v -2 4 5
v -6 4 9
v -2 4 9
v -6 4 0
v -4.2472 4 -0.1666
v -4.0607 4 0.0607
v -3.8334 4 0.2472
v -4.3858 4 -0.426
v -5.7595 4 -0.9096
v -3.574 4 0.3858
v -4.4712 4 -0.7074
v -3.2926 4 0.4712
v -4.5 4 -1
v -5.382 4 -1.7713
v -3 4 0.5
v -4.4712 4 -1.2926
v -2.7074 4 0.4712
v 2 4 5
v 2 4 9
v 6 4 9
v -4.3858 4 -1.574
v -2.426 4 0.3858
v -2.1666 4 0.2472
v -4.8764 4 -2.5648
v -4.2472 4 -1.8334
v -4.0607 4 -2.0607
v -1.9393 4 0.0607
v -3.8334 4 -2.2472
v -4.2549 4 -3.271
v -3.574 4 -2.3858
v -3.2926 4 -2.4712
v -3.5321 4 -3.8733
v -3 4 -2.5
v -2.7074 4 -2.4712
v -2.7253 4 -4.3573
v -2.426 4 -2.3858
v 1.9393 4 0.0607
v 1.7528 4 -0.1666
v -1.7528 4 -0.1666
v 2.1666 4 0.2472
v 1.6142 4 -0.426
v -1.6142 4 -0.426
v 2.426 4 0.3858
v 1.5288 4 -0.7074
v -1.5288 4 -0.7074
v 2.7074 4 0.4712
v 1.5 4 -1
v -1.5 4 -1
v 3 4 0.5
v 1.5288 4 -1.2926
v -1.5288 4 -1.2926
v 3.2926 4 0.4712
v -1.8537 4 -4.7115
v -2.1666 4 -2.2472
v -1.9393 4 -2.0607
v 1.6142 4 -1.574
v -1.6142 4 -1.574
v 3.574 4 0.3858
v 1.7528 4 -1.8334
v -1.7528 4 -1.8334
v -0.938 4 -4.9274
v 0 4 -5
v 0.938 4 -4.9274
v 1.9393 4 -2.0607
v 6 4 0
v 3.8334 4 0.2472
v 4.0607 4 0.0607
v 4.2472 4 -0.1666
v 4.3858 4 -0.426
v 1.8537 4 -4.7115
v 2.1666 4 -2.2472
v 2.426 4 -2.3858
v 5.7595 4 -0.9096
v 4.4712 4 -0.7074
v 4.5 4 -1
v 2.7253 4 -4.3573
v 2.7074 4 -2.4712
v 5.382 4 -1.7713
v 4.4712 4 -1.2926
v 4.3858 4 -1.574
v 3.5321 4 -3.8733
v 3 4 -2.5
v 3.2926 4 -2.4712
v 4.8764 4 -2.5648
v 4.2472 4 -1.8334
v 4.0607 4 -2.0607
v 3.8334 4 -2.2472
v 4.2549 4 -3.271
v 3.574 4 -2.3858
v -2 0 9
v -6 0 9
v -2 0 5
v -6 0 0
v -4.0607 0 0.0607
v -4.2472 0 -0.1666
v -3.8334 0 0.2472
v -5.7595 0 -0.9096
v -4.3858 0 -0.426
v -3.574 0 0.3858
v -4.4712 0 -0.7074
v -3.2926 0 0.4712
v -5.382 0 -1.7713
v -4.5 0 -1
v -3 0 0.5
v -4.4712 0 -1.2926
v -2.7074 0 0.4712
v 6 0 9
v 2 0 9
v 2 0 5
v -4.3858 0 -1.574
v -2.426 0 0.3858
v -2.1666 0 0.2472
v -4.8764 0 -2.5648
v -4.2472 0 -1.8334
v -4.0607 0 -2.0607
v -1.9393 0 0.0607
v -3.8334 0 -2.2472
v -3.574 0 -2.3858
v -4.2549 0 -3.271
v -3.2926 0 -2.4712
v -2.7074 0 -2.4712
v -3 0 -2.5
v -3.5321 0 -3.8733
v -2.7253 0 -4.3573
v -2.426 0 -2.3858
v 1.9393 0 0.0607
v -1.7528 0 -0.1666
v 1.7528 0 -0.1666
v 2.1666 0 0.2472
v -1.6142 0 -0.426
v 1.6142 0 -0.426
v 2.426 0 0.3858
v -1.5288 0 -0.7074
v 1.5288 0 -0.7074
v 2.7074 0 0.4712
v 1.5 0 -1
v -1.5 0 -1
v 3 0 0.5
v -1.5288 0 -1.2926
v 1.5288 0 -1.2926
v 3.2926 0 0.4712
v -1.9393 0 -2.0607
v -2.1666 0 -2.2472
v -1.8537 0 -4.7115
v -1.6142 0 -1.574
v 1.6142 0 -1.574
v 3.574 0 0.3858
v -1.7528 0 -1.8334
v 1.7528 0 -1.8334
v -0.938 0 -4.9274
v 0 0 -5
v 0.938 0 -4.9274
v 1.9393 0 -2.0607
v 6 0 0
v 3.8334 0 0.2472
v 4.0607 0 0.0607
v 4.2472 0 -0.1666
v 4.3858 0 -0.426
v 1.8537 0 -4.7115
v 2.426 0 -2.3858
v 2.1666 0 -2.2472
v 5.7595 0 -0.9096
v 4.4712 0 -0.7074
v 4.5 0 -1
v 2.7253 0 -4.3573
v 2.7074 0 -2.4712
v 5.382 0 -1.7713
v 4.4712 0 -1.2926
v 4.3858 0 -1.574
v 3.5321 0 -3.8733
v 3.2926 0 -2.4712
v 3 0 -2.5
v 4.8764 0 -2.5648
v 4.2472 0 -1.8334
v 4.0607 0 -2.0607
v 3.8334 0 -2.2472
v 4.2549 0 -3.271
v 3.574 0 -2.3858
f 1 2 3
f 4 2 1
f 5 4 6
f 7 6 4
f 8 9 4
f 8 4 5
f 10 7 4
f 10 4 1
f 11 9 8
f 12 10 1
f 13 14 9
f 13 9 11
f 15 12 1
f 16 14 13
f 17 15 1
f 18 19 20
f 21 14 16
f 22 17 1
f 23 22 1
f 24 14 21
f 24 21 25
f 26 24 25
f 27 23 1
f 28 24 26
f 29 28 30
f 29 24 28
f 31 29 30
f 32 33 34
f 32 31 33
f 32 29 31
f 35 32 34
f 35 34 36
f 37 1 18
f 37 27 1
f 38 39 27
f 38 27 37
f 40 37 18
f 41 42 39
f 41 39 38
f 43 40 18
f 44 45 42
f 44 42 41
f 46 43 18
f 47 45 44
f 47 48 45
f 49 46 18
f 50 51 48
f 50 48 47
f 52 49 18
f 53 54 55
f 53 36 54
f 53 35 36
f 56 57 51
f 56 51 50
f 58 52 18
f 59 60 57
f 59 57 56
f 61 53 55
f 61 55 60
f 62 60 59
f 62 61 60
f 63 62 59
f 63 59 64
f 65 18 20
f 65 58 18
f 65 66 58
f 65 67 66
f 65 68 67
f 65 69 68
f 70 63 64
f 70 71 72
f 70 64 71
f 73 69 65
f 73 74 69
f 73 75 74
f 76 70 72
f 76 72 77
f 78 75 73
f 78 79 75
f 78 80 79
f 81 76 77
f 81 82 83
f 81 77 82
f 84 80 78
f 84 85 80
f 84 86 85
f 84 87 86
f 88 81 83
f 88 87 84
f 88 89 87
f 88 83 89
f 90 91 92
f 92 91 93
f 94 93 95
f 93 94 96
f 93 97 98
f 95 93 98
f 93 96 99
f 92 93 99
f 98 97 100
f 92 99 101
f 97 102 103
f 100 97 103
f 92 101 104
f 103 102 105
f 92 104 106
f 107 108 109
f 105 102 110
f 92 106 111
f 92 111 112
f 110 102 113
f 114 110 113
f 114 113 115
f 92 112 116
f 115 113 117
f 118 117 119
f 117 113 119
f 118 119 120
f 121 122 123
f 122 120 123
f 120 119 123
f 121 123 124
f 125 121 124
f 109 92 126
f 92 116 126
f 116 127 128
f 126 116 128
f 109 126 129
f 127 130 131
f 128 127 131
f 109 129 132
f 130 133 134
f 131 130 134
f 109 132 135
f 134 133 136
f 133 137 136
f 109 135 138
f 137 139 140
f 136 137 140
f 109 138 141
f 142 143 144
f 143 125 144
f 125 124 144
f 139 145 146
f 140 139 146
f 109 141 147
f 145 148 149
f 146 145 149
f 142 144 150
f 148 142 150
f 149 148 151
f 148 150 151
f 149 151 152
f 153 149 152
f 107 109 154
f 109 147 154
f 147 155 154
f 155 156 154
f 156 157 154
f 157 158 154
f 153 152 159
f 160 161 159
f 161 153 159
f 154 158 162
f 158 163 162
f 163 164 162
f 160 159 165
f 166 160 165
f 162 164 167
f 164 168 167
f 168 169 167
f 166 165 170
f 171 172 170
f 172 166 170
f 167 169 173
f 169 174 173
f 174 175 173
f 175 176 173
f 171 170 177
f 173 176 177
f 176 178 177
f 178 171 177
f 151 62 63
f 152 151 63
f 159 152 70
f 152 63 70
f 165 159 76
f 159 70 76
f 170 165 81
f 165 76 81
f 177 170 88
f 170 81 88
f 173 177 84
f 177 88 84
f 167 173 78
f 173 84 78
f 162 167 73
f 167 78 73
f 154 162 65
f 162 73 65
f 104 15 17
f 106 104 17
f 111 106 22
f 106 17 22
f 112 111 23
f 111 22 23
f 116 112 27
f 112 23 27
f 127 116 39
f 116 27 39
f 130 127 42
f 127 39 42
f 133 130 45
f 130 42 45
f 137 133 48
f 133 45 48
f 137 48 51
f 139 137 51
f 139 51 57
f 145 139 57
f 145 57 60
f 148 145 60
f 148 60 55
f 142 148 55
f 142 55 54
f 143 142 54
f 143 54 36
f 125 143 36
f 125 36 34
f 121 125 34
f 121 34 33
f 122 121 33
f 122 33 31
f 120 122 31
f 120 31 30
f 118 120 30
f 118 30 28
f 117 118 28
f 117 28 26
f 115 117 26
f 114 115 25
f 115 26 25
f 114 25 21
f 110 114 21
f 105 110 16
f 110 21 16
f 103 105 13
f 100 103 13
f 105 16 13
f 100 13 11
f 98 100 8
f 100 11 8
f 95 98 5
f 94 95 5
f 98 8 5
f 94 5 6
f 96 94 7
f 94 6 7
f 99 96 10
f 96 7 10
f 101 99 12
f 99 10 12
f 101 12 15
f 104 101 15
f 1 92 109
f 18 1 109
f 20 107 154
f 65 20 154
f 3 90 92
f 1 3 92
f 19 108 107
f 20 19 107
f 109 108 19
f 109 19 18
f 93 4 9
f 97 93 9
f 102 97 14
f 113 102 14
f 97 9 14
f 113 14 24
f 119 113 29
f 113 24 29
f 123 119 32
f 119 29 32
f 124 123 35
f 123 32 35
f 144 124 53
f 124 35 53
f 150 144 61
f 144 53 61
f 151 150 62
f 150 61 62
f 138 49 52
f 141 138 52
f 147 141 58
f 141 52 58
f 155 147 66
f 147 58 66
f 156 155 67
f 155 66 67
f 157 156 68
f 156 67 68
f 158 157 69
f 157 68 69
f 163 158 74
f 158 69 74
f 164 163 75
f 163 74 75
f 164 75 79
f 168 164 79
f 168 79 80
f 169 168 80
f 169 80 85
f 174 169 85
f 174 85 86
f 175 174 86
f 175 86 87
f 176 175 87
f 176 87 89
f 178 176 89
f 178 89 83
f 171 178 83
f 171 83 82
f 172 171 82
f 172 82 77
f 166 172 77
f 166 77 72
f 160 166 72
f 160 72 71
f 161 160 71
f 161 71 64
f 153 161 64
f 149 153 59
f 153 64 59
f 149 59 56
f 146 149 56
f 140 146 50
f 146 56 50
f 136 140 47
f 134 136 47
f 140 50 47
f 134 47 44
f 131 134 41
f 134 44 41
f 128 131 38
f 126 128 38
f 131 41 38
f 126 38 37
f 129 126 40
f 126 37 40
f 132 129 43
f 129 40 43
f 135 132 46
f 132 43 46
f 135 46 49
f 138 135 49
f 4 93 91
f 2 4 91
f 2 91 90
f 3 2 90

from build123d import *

# Parameters (mm, degrees)
SKETCH1_W           = 12
SKETCH1_H           = 10
SKETCH1_W_2         = 4
SKETCH1_H_2         = 4
BOSS_EXTRUDE1_DEPTH = 4
SKETCH2_R           = 1.5
CUT_EXTRUDE1_DEPTH  = 12.532562595
CUT_EXTRUDE3_DEPTH  = 4


with BuildPart() as part:
    # Sketch1 → Boss-Extrude1 (new body)
    with BuildSketch(Plane(origin=(0, 0, 0), x_dir=(1, 0, 0), z_dir=(0, 1, 0))):
        Rectangle(SKETCH1_W, SKETCH1_H)
        with Locations((-4, -7)):
            Rectangle(SKETCH1_W_2, SKETCH1_H_2)
        with Locations((4, -7)):
            Rectangle(SKETCH1_W_2, SKETCH1_H_2)
    extrude(amount=BOSS_EXTRUDE1_DEPTH)

    # Sketch2 → Cut-Extrude1 (cut, through all)
    with BuildSketch(Plane(origin=(0, 4, 0), x_dir=(1, 0, 0), z_dir=(0, 1, 0))):
        with Locations(Location((-3, 1, 0), (0, 0, 270))):
            Circle(SKETCH2_R)
        with Locations(Location((3, 1, 0), (0, 0, 270))):
            Circle(SKETCH2_R)
    extrude(amount=-CUT_EXTRUDE1_DEPTH, mode=Mode.SUBTRACT)

    # Sketch3 → Cut-Extrude3 (cut)
    with BuildSketch(Plane(origin=(0, 4, 0), x_dir=(1, 0, 0), z_dir=(0, 1, 0))):
        with BuildLine():
            ThreePointArc((-6, 0), (-3.905124845, 3.586149799), (-1.9e-08, 5))
            Line((-1.9e-08, 5), (-6, 5))
            Line((-6, 5), (-6, 0))
        make_face()
        with BuildLine():
            ThreePointArc((-1.9e-08, 5), (3.905124831, 3.586149812), (6, 0))
            Line((6, 0), (6, 5))
            Line((6, 5), (-1.9e-08, 5))
        make_face()
    extrude(amount=-CUT_EXTRUDE3_DEPTH, mode=Mode.SUBTRACT)


solid = part.part
